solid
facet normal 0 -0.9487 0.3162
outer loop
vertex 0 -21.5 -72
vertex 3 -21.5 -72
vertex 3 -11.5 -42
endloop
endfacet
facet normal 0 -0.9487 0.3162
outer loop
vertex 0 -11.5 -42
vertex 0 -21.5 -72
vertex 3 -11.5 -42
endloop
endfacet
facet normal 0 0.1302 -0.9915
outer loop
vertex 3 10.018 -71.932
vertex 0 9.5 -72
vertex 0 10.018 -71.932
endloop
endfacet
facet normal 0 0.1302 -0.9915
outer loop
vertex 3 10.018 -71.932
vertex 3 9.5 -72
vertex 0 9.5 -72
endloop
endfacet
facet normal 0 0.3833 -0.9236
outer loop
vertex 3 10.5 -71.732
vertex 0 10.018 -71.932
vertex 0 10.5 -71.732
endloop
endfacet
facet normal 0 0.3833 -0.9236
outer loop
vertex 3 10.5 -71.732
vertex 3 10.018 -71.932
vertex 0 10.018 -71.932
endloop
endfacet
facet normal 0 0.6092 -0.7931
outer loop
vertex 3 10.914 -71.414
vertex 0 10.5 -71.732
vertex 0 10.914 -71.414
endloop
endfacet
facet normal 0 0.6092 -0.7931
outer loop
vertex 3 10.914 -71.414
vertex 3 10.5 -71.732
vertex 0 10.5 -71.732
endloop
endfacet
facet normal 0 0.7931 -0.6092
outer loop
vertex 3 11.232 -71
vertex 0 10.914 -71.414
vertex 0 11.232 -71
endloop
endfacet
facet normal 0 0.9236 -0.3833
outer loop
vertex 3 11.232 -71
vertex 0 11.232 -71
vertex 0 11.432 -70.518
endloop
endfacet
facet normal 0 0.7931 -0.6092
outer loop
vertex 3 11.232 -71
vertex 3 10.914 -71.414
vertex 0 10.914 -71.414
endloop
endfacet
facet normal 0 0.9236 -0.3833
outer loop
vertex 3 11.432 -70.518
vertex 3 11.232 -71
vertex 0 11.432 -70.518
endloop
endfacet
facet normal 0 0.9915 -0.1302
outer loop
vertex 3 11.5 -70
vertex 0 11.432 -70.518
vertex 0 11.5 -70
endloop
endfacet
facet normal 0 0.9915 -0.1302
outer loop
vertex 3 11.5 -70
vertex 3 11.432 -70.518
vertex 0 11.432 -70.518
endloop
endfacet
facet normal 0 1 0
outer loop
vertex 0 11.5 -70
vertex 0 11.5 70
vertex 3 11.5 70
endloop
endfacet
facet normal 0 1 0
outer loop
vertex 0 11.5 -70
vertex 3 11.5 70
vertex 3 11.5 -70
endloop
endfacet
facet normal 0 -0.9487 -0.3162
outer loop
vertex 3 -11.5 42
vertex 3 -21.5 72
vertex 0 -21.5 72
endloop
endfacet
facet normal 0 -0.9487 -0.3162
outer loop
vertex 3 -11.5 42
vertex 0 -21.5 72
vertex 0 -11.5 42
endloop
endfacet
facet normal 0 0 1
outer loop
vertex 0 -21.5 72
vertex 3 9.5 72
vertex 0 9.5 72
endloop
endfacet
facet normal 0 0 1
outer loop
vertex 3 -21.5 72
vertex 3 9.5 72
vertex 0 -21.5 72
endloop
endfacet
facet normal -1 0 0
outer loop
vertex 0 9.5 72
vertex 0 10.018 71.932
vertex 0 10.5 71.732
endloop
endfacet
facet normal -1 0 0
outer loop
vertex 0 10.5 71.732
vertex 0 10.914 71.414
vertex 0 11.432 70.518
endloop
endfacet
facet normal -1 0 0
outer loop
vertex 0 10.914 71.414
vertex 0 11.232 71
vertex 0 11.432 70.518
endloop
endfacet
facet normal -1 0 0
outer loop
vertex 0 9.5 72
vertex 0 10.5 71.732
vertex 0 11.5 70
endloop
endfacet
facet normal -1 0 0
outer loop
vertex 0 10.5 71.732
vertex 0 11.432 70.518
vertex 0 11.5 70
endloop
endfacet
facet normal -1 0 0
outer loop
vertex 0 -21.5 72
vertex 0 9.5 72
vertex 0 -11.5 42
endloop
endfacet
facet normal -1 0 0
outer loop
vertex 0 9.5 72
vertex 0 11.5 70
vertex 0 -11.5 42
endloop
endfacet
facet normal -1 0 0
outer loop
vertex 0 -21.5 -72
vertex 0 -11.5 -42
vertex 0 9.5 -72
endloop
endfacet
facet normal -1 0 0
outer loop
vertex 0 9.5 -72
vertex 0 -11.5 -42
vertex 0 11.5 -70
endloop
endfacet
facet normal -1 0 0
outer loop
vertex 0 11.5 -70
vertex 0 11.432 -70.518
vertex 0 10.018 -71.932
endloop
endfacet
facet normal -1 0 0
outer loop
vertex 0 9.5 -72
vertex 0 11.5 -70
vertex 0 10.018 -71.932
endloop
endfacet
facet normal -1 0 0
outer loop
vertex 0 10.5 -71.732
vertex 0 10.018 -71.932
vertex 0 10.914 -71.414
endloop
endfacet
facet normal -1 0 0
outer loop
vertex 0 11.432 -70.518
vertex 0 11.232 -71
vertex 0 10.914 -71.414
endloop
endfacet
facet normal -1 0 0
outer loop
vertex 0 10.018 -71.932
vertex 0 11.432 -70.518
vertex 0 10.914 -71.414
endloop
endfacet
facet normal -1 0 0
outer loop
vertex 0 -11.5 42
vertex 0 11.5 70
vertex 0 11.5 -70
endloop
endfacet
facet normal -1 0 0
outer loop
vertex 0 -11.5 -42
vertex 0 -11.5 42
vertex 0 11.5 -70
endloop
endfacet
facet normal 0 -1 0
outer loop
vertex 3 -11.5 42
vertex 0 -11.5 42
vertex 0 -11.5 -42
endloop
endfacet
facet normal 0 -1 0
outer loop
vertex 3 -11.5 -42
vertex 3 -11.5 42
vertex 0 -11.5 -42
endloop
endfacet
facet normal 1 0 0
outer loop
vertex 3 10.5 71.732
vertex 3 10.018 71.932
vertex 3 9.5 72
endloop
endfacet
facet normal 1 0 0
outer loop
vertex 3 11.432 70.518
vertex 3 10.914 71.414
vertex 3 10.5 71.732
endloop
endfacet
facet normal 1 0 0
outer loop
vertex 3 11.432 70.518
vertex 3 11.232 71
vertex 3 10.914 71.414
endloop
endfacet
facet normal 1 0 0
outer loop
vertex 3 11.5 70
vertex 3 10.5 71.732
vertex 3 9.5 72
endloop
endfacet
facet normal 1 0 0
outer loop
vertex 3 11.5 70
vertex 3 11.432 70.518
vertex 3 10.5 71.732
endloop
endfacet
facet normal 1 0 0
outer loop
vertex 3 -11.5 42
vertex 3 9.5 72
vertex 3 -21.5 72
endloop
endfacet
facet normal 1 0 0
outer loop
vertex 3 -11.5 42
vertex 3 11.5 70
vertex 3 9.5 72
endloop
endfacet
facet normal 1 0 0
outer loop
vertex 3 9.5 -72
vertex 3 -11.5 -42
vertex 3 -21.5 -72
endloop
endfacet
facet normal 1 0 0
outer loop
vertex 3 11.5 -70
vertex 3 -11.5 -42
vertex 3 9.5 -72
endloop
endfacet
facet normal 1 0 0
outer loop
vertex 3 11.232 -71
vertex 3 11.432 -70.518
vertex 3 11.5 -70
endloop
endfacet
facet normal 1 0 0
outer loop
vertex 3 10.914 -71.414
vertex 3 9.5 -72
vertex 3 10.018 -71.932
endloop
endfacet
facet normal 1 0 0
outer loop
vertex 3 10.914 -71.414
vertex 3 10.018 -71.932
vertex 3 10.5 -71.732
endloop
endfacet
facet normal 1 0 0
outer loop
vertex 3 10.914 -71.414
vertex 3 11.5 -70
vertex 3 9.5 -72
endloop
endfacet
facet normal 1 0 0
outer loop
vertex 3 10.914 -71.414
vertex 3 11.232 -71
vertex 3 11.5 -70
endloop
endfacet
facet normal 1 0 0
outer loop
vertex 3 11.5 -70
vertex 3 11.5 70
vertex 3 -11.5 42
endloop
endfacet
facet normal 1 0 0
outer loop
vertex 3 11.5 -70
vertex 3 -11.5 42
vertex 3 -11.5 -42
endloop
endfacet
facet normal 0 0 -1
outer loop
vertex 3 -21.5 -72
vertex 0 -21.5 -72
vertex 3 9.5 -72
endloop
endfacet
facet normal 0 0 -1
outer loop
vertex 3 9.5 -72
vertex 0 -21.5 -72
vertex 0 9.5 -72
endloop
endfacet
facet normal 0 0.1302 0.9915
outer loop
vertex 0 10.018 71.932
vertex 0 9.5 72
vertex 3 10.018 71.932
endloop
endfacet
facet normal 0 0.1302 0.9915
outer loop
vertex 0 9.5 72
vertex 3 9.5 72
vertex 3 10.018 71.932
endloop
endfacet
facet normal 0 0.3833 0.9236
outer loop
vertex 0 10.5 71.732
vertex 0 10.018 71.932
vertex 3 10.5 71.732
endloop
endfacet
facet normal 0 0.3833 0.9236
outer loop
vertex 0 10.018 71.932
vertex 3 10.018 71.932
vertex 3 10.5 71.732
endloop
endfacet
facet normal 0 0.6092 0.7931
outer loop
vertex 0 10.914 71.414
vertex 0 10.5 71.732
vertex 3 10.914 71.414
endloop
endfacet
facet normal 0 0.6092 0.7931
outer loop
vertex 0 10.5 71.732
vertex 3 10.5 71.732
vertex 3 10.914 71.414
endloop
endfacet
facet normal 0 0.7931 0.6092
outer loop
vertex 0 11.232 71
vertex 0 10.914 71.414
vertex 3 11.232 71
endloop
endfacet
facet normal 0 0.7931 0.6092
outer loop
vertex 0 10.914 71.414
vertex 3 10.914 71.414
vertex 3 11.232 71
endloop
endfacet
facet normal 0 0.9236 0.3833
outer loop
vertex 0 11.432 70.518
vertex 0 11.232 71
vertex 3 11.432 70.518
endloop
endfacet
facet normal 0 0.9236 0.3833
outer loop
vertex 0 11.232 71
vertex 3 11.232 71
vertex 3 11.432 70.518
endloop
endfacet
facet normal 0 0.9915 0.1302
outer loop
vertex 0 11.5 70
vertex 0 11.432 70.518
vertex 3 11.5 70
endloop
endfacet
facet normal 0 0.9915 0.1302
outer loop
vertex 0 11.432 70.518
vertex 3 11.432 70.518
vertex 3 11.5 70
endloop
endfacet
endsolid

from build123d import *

# Parameters (mm, degrees)
SKETCH1_W           = 144
SKETCH1_H           = 23
BOSS_EXTRUDE1_DEPTH = 3
FILLET1_R           = 2
BOSS_EXTRUDE2_DEPTH = 3


with BuildPart() as part:
    # Sketch1 → Boss-Extrude1 (new body)
    with BuildSketch(Plane(origin=(0, 0, 0), x_dir=(0, 0, -1), z_dir=(1, 0, 0))):
        Rectangle(SKETCH1_W, SKETCH1_H)
    extrude(amount=BOSS_EXTRUDE1_DEPTH)

    # Fillet1
    fillet1_edges = [part.edges().sort_by_distance(p)[0] for p in [
        (1.5, 11.5, 72),
        (1.5, 11.5, -72),
    ]]
    fillet(fillet1_edges, radius=FILLET1_R)

    # Sketch2 → Boss-Extrude2 (add)
    with BuildSketch(Plane(origin=(3, 0, 0), x_dir=(0, 0, -1), z_dir=(1, 0, 0))):
        Polygon((-72, -11.5), (-72, -21.5), (-42, -11.5), align=None)
        Polygon((72, -11.5), (72, -21.5), (42, -11.5), align=None)
    extrude(amount=-BOSS_EXTRUDE2_DEPTH)


solid = part.part
